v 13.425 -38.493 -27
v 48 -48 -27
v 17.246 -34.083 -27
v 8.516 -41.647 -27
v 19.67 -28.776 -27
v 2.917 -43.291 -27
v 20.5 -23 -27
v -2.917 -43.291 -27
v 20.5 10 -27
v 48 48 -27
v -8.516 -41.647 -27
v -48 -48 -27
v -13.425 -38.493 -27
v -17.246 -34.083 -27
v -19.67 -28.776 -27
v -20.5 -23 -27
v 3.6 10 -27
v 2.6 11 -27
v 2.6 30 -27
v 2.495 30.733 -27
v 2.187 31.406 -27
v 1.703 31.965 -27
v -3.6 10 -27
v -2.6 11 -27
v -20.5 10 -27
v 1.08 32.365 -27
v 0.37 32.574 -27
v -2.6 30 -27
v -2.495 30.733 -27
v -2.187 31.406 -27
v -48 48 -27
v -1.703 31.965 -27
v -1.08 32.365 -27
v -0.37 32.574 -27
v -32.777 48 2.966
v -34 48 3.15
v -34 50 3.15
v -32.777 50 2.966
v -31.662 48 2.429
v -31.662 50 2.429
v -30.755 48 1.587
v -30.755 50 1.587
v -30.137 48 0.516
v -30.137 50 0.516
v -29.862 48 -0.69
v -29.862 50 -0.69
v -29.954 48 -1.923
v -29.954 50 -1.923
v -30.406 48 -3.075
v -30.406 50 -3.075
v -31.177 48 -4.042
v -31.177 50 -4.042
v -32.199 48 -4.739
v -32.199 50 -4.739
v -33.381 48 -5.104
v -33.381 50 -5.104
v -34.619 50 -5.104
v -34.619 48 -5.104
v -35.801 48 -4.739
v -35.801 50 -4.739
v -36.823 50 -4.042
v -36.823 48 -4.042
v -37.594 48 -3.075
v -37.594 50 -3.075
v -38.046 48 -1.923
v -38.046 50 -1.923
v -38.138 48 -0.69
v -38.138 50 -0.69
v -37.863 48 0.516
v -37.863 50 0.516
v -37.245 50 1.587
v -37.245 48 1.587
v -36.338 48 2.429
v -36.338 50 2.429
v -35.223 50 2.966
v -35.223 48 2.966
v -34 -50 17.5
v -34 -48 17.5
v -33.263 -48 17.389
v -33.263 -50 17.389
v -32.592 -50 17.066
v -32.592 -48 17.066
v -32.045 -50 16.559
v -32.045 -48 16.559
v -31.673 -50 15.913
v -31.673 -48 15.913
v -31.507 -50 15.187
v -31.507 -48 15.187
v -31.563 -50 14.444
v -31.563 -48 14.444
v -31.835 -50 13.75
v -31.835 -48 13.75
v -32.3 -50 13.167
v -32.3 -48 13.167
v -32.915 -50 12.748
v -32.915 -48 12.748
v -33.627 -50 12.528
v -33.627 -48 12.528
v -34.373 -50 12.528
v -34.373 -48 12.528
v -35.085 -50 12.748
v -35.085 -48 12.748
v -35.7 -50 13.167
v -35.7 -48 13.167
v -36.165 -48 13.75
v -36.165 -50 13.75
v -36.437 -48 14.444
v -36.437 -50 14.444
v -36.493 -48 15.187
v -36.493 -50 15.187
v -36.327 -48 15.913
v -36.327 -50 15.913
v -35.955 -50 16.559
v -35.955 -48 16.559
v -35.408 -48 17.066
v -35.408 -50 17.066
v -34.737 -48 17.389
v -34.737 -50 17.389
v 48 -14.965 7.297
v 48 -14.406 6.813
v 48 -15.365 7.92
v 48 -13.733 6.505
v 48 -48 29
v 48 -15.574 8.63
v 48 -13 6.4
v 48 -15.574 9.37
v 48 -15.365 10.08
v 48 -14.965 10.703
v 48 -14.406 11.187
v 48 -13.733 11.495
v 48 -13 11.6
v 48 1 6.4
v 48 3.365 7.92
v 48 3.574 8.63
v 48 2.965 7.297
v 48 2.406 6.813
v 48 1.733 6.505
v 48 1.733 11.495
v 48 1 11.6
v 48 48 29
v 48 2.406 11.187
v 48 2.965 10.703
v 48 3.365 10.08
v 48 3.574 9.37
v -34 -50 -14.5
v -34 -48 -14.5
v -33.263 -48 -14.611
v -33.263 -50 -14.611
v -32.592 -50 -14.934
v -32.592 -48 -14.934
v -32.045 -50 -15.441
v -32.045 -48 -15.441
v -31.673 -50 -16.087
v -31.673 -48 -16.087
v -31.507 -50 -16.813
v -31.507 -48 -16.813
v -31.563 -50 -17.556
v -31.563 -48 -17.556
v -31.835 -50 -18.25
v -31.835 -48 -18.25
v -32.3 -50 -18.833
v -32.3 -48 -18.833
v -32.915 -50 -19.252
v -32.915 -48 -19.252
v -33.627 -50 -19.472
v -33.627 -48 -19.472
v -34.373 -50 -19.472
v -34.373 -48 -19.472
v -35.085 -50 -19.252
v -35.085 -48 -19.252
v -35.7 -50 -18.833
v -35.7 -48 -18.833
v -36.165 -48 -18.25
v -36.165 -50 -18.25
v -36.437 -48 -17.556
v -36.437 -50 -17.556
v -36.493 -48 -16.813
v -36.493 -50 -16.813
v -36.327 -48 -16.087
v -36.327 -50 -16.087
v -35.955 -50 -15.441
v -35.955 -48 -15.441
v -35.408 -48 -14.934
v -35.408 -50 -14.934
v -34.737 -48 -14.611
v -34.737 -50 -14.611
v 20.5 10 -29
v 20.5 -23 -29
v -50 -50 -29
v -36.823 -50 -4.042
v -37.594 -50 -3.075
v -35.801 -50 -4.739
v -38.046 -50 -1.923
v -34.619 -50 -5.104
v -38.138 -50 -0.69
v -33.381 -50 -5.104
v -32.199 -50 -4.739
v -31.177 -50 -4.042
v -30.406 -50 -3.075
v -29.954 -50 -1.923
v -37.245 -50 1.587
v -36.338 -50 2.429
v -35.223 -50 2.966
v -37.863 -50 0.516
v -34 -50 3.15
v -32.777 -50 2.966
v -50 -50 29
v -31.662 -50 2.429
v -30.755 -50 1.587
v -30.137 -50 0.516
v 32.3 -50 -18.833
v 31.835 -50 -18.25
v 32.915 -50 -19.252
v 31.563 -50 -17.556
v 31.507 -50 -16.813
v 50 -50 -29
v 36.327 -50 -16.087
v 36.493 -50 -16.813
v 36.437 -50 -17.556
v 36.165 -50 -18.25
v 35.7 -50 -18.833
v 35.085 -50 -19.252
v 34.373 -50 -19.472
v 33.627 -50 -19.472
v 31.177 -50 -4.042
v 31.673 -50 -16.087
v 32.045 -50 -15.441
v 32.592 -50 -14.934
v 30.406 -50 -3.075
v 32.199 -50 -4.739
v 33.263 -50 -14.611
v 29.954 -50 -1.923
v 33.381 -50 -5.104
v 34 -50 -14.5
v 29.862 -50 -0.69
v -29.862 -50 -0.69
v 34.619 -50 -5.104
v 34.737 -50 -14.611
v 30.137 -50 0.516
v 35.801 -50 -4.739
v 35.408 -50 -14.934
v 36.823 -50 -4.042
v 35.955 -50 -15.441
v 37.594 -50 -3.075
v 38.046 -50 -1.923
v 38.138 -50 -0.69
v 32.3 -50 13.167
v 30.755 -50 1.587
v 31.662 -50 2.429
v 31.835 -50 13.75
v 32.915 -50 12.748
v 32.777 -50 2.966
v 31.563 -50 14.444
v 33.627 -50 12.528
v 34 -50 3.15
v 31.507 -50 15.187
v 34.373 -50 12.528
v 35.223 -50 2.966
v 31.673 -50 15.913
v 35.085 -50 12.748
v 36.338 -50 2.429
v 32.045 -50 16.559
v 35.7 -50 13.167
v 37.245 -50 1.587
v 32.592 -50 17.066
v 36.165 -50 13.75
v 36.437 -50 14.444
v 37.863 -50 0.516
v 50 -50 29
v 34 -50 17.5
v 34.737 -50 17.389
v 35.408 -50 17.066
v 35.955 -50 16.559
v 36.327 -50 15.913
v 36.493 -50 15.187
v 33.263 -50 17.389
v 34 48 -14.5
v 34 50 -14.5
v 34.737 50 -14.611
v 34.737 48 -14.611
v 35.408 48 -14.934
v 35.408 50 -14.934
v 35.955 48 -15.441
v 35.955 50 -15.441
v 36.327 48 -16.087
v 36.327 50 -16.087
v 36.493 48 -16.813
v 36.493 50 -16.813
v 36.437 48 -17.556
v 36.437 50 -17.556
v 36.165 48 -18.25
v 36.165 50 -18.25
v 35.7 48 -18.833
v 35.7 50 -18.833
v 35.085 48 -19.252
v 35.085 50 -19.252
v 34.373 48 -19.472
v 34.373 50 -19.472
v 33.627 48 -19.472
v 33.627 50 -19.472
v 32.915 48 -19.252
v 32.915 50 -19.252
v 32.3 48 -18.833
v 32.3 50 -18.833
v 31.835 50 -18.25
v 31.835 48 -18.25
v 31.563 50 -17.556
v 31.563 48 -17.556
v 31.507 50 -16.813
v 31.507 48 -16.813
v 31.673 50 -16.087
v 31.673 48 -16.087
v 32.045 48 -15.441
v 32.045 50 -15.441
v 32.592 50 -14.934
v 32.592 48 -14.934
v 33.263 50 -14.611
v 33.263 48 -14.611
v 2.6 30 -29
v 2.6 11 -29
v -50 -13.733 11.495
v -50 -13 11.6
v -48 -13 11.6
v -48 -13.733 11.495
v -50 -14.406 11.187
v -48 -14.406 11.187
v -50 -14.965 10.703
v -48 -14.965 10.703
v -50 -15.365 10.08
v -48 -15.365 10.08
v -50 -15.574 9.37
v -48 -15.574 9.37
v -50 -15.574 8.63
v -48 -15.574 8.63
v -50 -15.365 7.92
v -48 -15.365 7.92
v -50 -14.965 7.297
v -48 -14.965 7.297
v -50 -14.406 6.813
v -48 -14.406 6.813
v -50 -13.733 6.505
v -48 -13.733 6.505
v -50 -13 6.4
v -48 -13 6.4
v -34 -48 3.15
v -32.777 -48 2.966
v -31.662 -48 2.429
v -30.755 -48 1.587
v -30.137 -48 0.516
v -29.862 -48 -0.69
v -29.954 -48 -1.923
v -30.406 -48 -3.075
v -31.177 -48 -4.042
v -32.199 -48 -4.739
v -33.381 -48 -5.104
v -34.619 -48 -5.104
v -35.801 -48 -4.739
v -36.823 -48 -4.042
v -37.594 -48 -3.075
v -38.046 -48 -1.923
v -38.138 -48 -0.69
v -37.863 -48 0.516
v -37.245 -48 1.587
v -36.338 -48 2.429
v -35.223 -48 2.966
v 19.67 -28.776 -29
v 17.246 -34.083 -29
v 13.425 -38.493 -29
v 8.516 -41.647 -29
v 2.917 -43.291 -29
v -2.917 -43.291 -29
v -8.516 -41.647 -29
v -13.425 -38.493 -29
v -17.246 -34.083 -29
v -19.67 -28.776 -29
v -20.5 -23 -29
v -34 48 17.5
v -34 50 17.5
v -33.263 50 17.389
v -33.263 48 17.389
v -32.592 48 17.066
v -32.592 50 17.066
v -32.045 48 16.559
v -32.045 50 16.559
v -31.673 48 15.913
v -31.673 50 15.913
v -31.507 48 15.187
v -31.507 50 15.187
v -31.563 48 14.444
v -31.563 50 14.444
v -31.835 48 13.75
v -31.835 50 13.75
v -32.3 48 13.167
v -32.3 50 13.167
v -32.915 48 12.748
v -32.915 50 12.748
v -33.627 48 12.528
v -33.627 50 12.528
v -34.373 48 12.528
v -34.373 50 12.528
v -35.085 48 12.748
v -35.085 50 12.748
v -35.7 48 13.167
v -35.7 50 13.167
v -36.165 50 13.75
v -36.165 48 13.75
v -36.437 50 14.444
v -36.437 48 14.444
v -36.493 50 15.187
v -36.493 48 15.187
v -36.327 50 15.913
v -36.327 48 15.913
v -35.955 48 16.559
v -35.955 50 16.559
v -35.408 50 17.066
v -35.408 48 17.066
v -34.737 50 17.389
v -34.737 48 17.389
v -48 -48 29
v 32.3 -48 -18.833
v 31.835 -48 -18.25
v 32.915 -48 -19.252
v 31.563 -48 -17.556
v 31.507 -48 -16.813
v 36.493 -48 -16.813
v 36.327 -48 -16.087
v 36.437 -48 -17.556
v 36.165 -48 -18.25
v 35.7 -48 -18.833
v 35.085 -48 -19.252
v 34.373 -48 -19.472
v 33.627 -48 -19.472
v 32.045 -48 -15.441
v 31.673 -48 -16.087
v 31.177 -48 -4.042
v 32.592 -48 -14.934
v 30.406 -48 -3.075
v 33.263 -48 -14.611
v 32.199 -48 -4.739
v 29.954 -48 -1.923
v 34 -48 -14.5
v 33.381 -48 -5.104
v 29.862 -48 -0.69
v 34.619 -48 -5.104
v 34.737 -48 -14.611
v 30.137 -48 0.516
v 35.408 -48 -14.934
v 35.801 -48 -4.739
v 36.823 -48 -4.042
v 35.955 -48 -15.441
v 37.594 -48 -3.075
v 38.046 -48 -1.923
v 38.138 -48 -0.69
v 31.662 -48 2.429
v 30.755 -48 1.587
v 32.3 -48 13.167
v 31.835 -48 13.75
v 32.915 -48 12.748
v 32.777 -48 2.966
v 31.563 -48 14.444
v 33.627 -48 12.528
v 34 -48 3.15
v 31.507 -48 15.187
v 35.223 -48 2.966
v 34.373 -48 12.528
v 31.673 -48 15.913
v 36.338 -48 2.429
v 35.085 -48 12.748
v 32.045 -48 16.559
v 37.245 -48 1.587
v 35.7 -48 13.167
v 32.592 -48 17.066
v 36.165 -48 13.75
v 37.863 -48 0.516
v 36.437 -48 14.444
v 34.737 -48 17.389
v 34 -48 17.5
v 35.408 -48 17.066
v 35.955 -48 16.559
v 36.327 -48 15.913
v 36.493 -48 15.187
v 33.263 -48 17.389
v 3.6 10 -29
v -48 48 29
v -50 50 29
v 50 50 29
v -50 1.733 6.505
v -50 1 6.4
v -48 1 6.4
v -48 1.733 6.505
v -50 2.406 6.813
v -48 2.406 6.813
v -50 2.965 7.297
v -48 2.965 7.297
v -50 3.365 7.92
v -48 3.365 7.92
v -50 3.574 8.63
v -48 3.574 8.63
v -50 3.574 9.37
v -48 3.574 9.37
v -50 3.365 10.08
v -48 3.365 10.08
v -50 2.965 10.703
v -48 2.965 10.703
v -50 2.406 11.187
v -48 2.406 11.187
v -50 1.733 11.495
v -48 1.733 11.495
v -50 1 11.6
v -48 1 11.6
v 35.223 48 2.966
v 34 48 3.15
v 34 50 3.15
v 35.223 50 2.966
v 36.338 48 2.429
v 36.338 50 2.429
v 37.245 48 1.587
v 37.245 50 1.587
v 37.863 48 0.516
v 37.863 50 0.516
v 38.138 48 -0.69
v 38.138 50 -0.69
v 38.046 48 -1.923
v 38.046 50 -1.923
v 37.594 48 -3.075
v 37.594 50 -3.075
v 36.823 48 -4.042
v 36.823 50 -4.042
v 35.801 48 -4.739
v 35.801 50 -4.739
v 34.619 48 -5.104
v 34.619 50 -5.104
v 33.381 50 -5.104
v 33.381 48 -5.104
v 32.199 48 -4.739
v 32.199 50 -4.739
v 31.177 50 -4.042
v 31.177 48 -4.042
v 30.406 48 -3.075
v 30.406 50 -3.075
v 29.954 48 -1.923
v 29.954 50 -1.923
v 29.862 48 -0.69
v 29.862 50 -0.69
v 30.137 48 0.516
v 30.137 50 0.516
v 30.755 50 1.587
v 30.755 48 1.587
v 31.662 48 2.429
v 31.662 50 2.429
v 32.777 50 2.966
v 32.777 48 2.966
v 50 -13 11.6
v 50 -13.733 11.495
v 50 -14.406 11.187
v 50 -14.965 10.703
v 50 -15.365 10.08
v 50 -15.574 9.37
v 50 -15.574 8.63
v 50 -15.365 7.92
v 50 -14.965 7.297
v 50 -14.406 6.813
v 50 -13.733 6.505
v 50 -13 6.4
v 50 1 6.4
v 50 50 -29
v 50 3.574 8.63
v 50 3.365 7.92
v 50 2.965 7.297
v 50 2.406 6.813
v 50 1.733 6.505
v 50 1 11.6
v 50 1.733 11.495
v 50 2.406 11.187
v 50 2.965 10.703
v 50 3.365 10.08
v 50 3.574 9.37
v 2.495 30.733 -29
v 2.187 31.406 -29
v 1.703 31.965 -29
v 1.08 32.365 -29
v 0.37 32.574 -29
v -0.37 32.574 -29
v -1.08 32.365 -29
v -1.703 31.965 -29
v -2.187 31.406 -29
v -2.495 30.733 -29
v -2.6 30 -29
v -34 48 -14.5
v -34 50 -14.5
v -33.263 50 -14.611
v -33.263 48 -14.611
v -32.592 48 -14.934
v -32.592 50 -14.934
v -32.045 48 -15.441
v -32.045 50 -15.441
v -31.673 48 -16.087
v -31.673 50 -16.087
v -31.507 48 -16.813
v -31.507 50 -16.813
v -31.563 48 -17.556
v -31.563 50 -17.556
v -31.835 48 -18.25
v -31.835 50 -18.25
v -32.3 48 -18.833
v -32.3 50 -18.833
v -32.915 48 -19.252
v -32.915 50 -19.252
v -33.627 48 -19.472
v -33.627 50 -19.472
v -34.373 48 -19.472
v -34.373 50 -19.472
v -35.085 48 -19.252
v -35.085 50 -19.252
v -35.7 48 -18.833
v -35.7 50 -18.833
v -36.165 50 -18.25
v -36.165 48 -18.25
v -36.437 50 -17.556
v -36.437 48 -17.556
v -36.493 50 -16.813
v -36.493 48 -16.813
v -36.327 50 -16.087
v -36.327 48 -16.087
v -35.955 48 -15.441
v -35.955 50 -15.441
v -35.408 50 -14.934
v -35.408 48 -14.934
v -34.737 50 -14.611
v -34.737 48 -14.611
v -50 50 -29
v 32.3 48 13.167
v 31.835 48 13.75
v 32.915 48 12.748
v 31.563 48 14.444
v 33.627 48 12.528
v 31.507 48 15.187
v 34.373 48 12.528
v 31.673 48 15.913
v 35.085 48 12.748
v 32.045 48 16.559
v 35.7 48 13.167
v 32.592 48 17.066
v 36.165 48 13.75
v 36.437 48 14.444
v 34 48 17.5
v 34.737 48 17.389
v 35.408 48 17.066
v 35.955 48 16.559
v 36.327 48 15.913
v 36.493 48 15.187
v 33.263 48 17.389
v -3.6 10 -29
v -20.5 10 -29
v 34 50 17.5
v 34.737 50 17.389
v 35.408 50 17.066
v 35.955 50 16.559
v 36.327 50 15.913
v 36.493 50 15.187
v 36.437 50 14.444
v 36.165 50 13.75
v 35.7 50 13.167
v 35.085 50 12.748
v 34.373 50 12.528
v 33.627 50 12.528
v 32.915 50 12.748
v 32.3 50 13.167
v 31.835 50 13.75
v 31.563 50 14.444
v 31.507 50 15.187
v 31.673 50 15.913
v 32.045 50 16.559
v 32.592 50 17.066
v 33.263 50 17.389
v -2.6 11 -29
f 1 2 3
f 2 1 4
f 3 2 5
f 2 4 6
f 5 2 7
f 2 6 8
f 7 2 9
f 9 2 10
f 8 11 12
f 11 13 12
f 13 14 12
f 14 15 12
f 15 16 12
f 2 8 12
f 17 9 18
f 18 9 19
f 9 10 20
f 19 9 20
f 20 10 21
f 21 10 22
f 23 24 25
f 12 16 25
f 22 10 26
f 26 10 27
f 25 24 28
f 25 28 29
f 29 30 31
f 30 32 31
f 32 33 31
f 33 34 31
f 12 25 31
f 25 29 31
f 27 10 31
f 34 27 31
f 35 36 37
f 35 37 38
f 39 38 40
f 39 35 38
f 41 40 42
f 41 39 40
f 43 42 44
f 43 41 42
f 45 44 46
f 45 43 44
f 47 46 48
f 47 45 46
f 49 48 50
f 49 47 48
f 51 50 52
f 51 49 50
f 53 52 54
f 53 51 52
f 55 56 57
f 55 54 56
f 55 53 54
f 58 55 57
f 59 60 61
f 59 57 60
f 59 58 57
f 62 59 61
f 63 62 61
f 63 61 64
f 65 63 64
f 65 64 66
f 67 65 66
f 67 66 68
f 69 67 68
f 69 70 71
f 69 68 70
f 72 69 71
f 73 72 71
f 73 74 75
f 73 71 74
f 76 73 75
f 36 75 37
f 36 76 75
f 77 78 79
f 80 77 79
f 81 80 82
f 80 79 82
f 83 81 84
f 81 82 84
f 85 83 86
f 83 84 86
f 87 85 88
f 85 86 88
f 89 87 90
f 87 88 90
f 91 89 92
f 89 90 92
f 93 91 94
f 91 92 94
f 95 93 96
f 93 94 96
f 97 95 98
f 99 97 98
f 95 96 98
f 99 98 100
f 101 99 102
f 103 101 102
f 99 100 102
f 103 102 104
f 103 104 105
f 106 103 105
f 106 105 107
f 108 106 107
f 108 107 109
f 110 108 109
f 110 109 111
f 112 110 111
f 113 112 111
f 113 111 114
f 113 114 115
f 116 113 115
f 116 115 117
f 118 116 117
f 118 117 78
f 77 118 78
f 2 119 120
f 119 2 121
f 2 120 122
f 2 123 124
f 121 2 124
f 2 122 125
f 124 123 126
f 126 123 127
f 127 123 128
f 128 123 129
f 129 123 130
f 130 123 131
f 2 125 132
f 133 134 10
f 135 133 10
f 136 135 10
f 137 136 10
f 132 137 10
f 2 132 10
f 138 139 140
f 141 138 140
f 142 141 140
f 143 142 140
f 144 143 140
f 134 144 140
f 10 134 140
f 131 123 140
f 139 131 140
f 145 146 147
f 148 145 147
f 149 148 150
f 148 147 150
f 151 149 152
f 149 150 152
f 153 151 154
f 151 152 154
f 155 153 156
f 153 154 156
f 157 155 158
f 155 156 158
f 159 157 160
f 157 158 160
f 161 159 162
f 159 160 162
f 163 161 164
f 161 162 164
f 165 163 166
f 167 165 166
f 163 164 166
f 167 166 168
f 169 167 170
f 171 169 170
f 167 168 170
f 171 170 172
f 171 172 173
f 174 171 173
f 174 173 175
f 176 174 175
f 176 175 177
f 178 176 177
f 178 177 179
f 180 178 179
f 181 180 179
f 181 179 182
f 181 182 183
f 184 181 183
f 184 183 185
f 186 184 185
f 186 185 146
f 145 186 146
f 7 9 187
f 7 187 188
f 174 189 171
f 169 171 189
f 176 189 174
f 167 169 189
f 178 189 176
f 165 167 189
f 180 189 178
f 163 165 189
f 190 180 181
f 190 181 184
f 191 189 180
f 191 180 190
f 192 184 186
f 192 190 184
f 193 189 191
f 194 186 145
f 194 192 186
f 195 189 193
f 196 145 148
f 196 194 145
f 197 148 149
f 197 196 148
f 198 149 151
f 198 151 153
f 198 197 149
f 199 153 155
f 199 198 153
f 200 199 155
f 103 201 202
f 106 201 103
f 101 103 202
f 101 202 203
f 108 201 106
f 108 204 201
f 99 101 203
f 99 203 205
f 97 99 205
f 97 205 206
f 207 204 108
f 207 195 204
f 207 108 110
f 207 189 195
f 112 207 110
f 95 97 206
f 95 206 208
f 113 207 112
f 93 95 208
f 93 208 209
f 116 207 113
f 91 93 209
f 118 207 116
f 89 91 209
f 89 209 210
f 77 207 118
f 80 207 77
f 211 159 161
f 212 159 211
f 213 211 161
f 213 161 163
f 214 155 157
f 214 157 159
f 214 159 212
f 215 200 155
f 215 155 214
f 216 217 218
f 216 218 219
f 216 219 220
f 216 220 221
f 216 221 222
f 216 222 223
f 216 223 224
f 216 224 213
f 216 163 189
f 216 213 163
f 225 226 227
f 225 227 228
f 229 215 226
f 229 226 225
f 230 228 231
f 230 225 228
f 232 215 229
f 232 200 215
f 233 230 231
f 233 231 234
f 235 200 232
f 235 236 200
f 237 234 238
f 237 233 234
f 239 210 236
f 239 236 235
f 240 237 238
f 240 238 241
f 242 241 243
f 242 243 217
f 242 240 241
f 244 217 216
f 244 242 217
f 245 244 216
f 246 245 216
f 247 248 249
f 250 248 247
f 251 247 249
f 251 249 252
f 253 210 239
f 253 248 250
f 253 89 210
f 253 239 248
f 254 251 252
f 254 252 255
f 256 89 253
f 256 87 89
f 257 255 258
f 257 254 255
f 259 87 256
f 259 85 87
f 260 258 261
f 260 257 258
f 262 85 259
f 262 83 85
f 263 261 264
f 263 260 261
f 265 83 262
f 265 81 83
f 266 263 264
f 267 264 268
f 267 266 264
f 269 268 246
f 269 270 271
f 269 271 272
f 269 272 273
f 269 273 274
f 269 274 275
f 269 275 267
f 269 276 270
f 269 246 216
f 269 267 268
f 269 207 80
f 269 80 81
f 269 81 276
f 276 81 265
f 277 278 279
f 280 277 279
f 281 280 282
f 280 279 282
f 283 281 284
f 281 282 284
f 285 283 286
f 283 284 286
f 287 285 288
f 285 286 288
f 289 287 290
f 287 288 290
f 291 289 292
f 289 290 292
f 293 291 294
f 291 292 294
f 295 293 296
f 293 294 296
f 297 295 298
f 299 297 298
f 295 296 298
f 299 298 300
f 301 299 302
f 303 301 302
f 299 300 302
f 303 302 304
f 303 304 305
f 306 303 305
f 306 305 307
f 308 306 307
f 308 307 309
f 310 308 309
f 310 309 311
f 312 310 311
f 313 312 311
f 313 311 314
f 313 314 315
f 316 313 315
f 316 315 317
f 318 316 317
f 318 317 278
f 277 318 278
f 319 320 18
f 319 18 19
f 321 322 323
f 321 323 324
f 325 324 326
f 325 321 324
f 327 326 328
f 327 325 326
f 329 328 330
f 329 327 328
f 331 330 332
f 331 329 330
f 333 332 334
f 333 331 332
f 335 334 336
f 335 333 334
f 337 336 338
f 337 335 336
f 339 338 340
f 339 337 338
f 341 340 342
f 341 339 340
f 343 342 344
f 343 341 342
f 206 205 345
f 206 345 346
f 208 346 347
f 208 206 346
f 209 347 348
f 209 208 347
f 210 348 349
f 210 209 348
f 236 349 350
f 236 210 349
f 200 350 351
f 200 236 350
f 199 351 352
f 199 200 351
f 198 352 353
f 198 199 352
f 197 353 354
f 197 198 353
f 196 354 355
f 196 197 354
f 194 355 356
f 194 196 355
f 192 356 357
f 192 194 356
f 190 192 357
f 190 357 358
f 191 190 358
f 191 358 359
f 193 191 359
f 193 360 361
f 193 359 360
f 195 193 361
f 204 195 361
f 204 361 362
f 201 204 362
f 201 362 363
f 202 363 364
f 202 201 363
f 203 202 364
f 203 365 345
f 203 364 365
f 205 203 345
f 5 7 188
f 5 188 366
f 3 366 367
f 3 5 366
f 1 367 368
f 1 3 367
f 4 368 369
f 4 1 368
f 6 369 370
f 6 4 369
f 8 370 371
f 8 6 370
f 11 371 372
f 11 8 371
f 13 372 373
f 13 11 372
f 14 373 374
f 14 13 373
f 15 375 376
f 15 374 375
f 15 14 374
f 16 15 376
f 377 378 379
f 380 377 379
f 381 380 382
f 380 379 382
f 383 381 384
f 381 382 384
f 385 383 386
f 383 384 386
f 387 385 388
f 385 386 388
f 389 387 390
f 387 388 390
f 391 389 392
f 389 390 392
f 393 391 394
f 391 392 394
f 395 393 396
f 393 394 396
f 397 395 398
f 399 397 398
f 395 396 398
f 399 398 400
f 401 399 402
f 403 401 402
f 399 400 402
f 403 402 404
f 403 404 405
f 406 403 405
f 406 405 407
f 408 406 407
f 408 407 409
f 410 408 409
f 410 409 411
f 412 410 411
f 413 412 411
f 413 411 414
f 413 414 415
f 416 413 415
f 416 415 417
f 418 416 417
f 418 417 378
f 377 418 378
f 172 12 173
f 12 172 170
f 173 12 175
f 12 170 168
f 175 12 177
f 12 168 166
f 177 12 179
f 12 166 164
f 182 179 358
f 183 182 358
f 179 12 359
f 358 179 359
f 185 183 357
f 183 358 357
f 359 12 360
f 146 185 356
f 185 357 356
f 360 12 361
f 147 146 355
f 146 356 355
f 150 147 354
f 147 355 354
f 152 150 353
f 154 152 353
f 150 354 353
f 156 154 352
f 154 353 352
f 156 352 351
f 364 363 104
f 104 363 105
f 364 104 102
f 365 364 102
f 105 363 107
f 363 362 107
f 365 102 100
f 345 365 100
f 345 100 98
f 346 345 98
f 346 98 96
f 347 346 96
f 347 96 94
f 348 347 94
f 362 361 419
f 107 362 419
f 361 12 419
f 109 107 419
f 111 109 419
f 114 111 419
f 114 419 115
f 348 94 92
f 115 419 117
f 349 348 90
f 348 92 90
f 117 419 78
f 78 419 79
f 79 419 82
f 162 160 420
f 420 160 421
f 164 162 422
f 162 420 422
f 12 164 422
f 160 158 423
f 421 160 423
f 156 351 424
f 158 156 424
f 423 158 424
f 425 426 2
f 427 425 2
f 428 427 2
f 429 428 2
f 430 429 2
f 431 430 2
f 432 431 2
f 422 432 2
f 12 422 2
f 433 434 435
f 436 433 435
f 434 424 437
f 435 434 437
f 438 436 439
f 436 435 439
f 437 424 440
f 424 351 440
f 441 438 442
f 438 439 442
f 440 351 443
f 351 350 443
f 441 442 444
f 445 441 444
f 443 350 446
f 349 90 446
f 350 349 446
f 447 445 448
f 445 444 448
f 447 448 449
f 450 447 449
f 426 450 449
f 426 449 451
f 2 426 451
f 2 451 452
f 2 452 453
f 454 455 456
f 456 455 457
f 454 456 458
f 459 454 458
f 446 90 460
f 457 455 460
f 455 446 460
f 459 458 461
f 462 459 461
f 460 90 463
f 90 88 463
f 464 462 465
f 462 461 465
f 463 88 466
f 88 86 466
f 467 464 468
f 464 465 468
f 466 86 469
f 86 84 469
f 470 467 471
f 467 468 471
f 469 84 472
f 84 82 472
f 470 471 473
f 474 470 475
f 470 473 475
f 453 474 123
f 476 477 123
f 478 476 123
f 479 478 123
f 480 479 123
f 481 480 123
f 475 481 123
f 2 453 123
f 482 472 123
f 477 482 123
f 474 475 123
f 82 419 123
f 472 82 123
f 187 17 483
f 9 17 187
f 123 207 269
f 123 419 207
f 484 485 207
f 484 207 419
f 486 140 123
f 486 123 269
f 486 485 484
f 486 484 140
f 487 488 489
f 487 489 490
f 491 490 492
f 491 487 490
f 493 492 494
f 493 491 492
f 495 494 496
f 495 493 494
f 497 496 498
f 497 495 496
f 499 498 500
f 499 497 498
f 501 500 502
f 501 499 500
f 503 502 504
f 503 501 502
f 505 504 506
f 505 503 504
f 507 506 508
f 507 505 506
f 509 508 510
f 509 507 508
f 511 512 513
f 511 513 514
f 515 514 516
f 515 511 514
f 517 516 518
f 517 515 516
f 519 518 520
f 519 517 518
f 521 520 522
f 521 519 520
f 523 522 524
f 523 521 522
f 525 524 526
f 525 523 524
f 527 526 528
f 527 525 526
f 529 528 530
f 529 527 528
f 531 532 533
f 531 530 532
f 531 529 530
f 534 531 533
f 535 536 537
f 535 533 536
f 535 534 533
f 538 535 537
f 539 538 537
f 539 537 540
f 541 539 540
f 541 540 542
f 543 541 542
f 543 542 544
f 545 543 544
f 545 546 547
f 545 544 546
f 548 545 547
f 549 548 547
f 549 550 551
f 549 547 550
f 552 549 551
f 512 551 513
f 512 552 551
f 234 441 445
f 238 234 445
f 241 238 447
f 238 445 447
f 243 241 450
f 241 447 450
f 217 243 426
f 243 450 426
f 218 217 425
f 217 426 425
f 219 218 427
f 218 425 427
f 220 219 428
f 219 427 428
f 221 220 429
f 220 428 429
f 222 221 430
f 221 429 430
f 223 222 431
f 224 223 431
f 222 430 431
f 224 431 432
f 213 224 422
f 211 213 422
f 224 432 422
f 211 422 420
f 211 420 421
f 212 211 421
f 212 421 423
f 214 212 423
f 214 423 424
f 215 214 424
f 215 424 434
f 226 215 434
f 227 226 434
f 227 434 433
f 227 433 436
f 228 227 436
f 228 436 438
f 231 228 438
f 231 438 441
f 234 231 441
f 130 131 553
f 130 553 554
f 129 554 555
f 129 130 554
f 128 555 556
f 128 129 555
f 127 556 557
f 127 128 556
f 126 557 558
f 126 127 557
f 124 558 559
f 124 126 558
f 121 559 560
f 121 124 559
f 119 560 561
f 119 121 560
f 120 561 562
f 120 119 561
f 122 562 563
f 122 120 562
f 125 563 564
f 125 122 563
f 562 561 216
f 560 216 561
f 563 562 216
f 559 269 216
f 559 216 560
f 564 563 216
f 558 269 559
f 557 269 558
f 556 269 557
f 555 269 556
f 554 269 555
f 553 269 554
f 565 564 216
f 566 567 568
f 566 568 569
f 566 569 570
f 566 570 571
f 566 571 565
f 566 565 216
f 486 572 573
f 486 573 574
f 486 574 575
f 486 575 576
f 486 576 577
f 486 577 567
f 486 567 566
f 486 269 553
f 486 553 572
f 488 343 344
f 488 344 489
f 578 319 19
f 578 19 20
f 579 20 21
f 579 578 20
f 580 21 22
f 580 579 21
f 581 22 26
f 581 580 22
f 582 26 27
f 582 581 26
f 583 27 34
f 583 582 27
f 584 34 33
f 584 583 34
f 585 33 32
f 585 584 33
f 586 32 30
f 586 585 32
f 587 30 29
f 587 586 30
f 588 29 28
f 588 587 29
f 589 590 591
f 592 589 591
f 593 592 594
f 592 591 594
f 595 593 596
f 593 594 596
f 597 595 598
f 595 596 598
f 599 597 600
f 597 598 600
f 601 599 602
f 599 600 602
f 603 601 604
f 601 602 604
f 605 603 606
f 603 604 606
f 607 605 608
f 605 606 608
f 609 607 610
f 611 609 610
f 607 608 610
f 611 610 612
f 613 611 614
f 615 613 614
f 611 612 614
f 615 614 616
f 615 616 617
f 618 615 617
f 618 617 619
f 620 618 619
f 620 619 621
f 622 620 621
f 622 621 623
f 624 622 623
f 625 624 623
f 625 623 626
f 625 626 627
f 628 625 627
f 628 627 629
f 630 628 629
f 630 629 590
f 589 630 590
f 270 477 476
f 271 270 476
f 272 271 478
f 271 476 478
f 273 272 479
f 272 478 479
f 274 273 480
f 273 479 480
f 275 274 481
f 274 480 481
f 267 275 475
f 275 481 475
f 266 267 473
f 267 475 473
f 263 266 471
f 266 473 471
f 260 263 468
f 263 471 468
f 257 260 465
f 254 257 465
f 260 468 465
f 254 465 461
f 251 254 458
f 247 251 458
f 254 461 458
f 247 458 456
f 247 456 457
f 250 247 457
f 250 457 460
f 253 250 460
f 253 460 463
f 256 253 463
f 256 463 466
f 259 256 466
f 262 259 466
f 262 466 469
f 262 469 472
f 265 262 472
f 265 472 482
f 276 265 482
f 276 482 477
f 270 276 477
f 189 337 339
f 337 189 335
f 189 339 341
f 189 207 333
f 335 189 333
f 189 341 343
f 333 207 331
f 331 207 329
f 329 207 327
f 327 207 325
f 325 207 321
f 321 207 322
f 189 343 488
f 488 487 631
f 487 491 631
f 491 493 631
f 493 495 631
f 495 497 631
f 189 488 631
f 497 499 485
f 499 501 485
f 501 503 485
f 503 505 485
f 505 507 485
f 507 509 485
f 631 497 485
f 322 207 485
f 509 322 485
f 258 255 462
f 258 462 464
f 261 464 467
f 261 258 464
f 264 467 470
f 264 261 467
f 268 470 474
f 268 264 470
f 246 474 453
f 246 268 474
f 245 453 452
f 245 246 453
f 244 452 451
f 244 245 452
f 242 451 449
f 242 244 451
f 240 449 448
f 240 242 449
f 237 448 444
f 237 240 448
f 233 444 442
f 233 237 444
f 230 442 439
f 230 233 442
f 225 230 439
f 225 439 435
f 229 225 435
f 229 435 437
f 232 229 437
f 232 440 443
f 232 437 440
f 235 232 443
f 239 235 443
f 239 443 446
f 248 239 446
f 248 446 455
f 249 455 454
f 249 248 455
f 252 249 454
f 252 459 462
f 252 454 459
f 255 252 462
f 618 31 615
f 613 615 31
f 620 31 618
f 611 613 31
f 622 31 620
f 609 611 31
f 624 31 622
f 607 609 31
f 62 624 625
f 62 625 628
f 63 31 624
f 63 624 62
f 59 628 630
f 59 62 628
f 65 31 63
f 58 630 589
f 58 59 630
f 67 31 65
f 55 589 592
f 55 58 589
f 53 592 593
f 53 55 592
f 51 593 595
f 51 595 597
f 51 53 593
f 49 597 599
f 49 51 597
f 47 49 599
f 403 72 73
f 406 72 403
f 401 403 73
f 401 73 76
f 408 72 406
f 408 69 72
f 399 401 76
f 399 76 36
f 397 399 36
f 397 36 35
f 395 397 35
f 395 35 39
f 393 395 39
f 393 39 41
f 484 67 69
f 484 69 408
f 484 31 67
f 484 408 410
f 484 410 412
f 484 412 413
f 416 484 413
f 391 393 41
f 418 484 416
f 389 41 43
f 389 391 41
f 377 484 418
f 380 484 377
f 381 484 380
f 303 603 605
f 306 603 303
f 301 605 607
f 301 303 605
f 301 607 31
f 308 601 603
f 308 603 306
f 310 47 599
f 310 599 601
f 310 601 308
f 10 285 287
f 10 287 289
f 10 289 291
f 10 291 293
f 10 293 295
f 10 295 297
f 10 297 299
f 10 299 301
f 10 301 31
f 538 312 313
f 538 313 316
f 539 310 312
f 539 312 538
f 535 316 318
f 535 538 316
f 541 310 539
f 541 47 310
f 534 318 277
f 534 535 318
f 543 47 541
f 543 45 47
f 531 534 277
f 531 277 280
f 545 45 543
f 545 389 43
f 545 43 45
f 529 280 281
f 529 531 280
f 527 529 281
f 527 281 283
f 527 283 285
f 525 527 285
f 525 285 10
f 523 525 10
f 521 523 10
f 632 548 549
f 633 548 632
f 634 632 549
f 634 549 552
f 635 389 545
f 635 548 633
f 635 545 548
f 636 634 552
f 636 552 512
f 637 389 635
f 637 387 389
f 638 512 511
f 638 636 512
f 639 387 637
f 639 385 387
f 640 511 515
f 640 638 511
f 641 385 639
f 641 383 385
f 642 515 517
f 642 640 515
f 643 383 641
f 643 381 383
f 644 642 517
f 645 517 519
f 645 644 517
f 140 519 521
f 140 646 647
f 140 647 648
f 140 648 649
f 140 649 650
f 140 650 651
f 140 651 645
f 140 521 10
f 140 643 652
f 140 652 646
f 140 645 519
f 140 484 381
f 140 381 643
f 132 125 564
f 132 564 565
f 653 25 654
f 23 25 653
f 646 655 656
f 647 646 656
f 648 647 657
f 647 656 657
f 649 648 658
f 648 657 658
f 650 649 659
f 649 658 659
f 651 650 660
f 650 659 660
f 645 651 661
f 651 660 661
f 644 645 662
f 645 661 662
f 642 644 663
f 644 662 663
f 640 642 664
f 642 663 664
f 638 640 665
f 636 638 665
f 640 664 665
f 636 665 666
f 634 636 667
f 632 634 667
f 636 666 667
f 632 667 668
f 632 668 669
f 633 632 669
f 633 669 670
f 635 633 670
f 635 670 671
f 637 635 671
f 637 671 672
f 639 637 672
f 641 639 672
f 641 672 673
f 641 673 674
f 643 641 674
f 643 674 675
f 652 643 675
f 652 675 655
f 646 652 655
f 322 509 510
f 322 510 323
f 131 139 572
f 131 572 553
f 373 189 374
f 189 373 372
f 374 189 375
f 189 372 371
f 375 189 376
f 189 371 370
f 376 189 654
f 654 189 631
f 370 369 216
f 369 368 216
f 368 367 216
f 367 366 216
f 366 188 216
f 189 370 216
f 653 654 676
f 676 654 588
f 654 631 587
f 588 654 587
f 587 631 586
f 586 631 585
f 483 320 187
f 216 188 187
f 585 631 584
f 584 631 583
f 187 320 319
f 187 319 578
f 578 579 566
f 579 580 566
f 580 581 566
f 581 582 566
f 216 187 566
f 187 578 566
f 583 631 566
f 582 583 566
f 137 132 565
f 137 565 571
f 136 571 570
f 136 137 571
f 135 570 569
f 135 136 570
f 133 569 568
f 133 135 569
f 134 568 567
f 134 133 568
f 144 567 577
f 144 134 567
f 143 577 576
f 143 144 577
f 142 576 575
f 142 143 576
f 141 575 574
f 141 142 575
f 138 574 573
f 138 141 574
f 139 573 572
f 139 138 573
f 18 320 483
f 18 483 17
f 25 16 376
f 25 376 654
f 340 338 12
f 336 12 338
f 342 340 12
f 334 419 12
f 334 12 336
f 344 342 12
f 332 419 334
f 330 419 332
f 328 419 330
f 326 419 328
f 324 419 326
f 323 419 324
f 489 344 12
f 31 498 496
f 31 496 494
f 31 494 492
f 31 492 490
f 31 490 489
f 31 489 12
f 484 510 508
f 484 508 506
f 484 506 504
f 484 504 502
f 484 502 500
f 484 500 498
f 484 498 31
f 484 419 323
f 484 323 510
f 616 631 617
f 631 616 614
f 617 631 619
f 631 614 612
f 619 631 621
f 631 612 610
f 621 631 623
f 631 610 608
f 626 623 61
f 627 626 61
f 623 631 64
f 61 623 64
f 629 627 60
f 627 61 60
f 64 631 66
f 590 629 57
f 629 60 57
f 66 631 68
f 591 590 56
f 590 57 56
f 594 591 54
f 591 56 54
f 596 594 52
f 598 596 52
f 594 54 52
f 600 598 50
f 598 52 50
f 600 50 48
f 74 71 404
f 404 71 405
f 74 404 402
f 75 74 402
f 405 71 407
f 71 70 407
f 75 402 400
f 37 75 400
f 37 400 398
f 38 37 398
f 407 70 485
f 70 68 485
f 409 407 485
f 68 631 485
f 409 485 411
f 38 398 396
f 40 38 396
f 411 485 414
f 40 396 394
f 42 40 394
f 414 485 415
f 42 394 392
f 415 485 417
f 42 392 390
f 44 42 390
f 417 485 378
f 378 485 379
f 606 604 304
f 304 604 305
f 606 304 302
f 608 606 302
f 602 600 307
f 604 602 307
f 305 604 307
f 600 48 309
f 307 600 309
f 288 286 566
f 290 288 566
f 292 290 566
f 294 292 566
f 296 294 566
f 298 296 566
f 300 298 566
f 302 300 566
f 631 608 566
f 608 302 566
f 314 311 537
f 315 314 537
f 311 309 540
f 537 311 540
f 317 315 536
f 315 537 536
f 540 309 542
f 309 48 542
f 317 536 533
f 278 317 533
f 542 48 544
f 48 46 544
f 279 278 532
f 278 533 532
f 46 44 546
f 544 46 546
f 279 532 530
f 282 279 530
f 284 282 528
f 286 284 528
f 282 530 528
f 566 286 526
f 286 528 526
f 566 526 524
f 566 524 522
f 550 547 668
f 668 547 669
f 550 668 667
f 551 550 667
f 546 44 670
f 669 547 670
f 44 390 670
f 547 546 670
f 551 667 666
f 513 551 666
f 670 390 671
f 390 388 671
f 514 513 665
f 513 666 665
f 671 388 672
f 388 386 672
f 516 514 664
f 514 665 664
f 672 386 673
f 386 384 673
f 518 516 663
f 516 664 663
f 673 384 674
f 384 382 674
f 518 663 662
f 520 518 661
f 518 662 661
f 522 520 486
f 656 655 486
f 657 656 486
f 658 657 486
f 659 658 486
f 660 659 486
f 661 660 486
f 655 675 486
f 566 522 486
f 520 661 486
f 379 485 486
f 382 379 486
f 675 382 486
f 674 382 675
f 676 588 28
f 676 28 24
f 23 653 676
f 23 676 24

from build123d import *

# Parameters (mm, degrees)
SKETCH1_W               = 100
SKETCH1_H               = 100
SKETCH1_W_2             = 96
SKETCH1_H_2             = 96
EXTRUDE_THIN1_DEPTH     = 29
SKETCH2_W               = 100
SKETCH2_H               = 100
BOSS_EXTRUDE1_DEPTH     = 2
CUT_EXTRUDE1_REACH      = 92.2
CUT_EXTRUDE2_DEPTH      = 160
CUT_EXTRUDE3_DEPTH      = 160
CHAMFER1_SIZE           = 1
CUT_EXTRUDE4_DEPTH      = 116.503246708
CUT_EXTRUDE4_DEPTH_BACK = 116.503246708
SKETCH7_R               = 4.15
SKETCH8_R               = 2.5
CUT_EXTRUDE5_DEPTH      = 177


with BuildPart() as part:
    # Sketch1 → Extrude-Thin1 (new, symmetric)
    with BuildSketch(Plane.XY):
        Rectangle(SKETCH1_W, SKETCH1_H)
        Rectangle(SKETCH1_W_2, SKETCH1_H_2, mode=Mode.SUBTRACT)
    extrude(amount=EXTRUDE_THIN1_DEPTH, both=True)

    # Sketch2 → Boss-Extrude1 (add)
    with BuildSketch(Plane(origin=(0, 0, -29), x_dir=(-1, 0, 0), z_dir=(0, 0, -1))):
        Rectangle(SKETCH2_W, SKETCH2_H)
    extrude(amount=-BOSS_EXTRUDE1_DEPTH)

    # Sketch3 → Cut-Extrude1 (cut, up to next)
    with BuildSketch(Plane.XY.offset(-27), mode=Mode.PRIVATE) as cut_extrude1_sk1:
        with BuildLine():
            Line((-20.5, -23), (-20.5, 10))
            Line((-20.5, 10), (20.5, 10))
            Line((20.5, 10), (20.5, -23))
            ThreePointArc((20.5, -23), (0, -43.5), (-20.5, -23))
        make_face()
    cut_extrude1_tool1 = extrude(cut_extrude1_sk1.sketch, amount=-CUT_EXTRUDE1_REACH, mode=Mode.PRIVATE) & part.part
    add(cut_extrude1_tool1.solids().sort_by_distance((0, -14.763519, -27))[0], mode=Mode.SUBTRACT)

    # Sketch4 → Cut-Extrude2 (cut)
    with BuildSketch(Plane.ZY.offset(50)):
        with BuildLine():
            Line((11.6, 1), (11.6, -13))
            ThreePointArc((11.6, -13), (9, -15.6), (6.4, -13))
            Line((6.4, -13), (6.4, 1))
            ThreePointArc((6.4, 1), (9, 3.6), (11.6, 1))
        make_face()
    extrude(amount=-CUT_EXTRUDE2_DEPTH, mode=Mode.SUBTRACT)

    # Sketch6 → Cut-Extrude3 (cut)
    with BuildSketch(Plane(origin=(0, 0, -29), x_dir=(-1, 0, 0), z_dir=(0, 0, -1))):
        with BuildLine():
            Line((-2.6, 10), (-2.6, 30))
            ThreePointArc((-2.6, 30), (0, 32.6), (2.6, 30))
            Line((2.6, 30), (2.6, 10))
            ThreePointArc((2.6, 10), (0, 7.4), (-2.6, 10))
        make_face()
    extrude(amount=-CUT_EXTRUDE3_DEPTH, mode=Mode.SUBTRACT)

    # Chamfer1
    chamfer1_edges = [part.edges().sort_by_distance(p)[0] for p in [
        (-2.6, 10, -28),
        (2.6, 10, -28),
    ]]
    chamfer(chamfer1_edges, length=CHAMFER1_SIZE)

    # Sketch7 → Cut-Extrude4 (cut, two sides: drawn at the far end of the back side and taken through both)
    with BuildSketch(Plane(origin=(0, 50, 0), x_dir=(1, 0, 0), z_dir=(0, 1, 0)).offset(-CUT_EXTRUDE4_DEPTH_BACK)):
        with Locations(Location((-34, 1, 0), (0, 0, 270))):
            Circle(SKETCH7_R)
        with Locations(Location((34, 1, 0), (0, 0, 270))):
            Circle(SKETCH7_R)
    extrude(amount=CUT_EXTRUDE4_DEPTH + CUT_EXTRUDE4_DEPTH_BACK, mode=Mode.SUBTRACT)

    # Sketch8 → Cut-Extrude5 (cut)
    with BuildSketch(Plane(origin=(0, 50, 0), x_dir=(1, 0, 0), z_dir=(0, 1, 0))):
        with Locations(Location((-34, 17, 0), (0, 0, 270))):
            Circle(SKETCH8_R)
        with Locations(Location((-34, -15, 0), (0, 0, 270))):
            Circle(SKETCH8_R)
        with Locations(Location((34, 17, 0), (0, 0, 270))):
            Circle(SKETCH8_R)
        with Locations(Location((34, -15, 0), (0, 0, 270))):
            Circle(SKETCH8_R)
    extrude(amount=-CUT_EXTRUDE5_DEPTH, mode=Mode.SUBTRACT)


solid = part.part
